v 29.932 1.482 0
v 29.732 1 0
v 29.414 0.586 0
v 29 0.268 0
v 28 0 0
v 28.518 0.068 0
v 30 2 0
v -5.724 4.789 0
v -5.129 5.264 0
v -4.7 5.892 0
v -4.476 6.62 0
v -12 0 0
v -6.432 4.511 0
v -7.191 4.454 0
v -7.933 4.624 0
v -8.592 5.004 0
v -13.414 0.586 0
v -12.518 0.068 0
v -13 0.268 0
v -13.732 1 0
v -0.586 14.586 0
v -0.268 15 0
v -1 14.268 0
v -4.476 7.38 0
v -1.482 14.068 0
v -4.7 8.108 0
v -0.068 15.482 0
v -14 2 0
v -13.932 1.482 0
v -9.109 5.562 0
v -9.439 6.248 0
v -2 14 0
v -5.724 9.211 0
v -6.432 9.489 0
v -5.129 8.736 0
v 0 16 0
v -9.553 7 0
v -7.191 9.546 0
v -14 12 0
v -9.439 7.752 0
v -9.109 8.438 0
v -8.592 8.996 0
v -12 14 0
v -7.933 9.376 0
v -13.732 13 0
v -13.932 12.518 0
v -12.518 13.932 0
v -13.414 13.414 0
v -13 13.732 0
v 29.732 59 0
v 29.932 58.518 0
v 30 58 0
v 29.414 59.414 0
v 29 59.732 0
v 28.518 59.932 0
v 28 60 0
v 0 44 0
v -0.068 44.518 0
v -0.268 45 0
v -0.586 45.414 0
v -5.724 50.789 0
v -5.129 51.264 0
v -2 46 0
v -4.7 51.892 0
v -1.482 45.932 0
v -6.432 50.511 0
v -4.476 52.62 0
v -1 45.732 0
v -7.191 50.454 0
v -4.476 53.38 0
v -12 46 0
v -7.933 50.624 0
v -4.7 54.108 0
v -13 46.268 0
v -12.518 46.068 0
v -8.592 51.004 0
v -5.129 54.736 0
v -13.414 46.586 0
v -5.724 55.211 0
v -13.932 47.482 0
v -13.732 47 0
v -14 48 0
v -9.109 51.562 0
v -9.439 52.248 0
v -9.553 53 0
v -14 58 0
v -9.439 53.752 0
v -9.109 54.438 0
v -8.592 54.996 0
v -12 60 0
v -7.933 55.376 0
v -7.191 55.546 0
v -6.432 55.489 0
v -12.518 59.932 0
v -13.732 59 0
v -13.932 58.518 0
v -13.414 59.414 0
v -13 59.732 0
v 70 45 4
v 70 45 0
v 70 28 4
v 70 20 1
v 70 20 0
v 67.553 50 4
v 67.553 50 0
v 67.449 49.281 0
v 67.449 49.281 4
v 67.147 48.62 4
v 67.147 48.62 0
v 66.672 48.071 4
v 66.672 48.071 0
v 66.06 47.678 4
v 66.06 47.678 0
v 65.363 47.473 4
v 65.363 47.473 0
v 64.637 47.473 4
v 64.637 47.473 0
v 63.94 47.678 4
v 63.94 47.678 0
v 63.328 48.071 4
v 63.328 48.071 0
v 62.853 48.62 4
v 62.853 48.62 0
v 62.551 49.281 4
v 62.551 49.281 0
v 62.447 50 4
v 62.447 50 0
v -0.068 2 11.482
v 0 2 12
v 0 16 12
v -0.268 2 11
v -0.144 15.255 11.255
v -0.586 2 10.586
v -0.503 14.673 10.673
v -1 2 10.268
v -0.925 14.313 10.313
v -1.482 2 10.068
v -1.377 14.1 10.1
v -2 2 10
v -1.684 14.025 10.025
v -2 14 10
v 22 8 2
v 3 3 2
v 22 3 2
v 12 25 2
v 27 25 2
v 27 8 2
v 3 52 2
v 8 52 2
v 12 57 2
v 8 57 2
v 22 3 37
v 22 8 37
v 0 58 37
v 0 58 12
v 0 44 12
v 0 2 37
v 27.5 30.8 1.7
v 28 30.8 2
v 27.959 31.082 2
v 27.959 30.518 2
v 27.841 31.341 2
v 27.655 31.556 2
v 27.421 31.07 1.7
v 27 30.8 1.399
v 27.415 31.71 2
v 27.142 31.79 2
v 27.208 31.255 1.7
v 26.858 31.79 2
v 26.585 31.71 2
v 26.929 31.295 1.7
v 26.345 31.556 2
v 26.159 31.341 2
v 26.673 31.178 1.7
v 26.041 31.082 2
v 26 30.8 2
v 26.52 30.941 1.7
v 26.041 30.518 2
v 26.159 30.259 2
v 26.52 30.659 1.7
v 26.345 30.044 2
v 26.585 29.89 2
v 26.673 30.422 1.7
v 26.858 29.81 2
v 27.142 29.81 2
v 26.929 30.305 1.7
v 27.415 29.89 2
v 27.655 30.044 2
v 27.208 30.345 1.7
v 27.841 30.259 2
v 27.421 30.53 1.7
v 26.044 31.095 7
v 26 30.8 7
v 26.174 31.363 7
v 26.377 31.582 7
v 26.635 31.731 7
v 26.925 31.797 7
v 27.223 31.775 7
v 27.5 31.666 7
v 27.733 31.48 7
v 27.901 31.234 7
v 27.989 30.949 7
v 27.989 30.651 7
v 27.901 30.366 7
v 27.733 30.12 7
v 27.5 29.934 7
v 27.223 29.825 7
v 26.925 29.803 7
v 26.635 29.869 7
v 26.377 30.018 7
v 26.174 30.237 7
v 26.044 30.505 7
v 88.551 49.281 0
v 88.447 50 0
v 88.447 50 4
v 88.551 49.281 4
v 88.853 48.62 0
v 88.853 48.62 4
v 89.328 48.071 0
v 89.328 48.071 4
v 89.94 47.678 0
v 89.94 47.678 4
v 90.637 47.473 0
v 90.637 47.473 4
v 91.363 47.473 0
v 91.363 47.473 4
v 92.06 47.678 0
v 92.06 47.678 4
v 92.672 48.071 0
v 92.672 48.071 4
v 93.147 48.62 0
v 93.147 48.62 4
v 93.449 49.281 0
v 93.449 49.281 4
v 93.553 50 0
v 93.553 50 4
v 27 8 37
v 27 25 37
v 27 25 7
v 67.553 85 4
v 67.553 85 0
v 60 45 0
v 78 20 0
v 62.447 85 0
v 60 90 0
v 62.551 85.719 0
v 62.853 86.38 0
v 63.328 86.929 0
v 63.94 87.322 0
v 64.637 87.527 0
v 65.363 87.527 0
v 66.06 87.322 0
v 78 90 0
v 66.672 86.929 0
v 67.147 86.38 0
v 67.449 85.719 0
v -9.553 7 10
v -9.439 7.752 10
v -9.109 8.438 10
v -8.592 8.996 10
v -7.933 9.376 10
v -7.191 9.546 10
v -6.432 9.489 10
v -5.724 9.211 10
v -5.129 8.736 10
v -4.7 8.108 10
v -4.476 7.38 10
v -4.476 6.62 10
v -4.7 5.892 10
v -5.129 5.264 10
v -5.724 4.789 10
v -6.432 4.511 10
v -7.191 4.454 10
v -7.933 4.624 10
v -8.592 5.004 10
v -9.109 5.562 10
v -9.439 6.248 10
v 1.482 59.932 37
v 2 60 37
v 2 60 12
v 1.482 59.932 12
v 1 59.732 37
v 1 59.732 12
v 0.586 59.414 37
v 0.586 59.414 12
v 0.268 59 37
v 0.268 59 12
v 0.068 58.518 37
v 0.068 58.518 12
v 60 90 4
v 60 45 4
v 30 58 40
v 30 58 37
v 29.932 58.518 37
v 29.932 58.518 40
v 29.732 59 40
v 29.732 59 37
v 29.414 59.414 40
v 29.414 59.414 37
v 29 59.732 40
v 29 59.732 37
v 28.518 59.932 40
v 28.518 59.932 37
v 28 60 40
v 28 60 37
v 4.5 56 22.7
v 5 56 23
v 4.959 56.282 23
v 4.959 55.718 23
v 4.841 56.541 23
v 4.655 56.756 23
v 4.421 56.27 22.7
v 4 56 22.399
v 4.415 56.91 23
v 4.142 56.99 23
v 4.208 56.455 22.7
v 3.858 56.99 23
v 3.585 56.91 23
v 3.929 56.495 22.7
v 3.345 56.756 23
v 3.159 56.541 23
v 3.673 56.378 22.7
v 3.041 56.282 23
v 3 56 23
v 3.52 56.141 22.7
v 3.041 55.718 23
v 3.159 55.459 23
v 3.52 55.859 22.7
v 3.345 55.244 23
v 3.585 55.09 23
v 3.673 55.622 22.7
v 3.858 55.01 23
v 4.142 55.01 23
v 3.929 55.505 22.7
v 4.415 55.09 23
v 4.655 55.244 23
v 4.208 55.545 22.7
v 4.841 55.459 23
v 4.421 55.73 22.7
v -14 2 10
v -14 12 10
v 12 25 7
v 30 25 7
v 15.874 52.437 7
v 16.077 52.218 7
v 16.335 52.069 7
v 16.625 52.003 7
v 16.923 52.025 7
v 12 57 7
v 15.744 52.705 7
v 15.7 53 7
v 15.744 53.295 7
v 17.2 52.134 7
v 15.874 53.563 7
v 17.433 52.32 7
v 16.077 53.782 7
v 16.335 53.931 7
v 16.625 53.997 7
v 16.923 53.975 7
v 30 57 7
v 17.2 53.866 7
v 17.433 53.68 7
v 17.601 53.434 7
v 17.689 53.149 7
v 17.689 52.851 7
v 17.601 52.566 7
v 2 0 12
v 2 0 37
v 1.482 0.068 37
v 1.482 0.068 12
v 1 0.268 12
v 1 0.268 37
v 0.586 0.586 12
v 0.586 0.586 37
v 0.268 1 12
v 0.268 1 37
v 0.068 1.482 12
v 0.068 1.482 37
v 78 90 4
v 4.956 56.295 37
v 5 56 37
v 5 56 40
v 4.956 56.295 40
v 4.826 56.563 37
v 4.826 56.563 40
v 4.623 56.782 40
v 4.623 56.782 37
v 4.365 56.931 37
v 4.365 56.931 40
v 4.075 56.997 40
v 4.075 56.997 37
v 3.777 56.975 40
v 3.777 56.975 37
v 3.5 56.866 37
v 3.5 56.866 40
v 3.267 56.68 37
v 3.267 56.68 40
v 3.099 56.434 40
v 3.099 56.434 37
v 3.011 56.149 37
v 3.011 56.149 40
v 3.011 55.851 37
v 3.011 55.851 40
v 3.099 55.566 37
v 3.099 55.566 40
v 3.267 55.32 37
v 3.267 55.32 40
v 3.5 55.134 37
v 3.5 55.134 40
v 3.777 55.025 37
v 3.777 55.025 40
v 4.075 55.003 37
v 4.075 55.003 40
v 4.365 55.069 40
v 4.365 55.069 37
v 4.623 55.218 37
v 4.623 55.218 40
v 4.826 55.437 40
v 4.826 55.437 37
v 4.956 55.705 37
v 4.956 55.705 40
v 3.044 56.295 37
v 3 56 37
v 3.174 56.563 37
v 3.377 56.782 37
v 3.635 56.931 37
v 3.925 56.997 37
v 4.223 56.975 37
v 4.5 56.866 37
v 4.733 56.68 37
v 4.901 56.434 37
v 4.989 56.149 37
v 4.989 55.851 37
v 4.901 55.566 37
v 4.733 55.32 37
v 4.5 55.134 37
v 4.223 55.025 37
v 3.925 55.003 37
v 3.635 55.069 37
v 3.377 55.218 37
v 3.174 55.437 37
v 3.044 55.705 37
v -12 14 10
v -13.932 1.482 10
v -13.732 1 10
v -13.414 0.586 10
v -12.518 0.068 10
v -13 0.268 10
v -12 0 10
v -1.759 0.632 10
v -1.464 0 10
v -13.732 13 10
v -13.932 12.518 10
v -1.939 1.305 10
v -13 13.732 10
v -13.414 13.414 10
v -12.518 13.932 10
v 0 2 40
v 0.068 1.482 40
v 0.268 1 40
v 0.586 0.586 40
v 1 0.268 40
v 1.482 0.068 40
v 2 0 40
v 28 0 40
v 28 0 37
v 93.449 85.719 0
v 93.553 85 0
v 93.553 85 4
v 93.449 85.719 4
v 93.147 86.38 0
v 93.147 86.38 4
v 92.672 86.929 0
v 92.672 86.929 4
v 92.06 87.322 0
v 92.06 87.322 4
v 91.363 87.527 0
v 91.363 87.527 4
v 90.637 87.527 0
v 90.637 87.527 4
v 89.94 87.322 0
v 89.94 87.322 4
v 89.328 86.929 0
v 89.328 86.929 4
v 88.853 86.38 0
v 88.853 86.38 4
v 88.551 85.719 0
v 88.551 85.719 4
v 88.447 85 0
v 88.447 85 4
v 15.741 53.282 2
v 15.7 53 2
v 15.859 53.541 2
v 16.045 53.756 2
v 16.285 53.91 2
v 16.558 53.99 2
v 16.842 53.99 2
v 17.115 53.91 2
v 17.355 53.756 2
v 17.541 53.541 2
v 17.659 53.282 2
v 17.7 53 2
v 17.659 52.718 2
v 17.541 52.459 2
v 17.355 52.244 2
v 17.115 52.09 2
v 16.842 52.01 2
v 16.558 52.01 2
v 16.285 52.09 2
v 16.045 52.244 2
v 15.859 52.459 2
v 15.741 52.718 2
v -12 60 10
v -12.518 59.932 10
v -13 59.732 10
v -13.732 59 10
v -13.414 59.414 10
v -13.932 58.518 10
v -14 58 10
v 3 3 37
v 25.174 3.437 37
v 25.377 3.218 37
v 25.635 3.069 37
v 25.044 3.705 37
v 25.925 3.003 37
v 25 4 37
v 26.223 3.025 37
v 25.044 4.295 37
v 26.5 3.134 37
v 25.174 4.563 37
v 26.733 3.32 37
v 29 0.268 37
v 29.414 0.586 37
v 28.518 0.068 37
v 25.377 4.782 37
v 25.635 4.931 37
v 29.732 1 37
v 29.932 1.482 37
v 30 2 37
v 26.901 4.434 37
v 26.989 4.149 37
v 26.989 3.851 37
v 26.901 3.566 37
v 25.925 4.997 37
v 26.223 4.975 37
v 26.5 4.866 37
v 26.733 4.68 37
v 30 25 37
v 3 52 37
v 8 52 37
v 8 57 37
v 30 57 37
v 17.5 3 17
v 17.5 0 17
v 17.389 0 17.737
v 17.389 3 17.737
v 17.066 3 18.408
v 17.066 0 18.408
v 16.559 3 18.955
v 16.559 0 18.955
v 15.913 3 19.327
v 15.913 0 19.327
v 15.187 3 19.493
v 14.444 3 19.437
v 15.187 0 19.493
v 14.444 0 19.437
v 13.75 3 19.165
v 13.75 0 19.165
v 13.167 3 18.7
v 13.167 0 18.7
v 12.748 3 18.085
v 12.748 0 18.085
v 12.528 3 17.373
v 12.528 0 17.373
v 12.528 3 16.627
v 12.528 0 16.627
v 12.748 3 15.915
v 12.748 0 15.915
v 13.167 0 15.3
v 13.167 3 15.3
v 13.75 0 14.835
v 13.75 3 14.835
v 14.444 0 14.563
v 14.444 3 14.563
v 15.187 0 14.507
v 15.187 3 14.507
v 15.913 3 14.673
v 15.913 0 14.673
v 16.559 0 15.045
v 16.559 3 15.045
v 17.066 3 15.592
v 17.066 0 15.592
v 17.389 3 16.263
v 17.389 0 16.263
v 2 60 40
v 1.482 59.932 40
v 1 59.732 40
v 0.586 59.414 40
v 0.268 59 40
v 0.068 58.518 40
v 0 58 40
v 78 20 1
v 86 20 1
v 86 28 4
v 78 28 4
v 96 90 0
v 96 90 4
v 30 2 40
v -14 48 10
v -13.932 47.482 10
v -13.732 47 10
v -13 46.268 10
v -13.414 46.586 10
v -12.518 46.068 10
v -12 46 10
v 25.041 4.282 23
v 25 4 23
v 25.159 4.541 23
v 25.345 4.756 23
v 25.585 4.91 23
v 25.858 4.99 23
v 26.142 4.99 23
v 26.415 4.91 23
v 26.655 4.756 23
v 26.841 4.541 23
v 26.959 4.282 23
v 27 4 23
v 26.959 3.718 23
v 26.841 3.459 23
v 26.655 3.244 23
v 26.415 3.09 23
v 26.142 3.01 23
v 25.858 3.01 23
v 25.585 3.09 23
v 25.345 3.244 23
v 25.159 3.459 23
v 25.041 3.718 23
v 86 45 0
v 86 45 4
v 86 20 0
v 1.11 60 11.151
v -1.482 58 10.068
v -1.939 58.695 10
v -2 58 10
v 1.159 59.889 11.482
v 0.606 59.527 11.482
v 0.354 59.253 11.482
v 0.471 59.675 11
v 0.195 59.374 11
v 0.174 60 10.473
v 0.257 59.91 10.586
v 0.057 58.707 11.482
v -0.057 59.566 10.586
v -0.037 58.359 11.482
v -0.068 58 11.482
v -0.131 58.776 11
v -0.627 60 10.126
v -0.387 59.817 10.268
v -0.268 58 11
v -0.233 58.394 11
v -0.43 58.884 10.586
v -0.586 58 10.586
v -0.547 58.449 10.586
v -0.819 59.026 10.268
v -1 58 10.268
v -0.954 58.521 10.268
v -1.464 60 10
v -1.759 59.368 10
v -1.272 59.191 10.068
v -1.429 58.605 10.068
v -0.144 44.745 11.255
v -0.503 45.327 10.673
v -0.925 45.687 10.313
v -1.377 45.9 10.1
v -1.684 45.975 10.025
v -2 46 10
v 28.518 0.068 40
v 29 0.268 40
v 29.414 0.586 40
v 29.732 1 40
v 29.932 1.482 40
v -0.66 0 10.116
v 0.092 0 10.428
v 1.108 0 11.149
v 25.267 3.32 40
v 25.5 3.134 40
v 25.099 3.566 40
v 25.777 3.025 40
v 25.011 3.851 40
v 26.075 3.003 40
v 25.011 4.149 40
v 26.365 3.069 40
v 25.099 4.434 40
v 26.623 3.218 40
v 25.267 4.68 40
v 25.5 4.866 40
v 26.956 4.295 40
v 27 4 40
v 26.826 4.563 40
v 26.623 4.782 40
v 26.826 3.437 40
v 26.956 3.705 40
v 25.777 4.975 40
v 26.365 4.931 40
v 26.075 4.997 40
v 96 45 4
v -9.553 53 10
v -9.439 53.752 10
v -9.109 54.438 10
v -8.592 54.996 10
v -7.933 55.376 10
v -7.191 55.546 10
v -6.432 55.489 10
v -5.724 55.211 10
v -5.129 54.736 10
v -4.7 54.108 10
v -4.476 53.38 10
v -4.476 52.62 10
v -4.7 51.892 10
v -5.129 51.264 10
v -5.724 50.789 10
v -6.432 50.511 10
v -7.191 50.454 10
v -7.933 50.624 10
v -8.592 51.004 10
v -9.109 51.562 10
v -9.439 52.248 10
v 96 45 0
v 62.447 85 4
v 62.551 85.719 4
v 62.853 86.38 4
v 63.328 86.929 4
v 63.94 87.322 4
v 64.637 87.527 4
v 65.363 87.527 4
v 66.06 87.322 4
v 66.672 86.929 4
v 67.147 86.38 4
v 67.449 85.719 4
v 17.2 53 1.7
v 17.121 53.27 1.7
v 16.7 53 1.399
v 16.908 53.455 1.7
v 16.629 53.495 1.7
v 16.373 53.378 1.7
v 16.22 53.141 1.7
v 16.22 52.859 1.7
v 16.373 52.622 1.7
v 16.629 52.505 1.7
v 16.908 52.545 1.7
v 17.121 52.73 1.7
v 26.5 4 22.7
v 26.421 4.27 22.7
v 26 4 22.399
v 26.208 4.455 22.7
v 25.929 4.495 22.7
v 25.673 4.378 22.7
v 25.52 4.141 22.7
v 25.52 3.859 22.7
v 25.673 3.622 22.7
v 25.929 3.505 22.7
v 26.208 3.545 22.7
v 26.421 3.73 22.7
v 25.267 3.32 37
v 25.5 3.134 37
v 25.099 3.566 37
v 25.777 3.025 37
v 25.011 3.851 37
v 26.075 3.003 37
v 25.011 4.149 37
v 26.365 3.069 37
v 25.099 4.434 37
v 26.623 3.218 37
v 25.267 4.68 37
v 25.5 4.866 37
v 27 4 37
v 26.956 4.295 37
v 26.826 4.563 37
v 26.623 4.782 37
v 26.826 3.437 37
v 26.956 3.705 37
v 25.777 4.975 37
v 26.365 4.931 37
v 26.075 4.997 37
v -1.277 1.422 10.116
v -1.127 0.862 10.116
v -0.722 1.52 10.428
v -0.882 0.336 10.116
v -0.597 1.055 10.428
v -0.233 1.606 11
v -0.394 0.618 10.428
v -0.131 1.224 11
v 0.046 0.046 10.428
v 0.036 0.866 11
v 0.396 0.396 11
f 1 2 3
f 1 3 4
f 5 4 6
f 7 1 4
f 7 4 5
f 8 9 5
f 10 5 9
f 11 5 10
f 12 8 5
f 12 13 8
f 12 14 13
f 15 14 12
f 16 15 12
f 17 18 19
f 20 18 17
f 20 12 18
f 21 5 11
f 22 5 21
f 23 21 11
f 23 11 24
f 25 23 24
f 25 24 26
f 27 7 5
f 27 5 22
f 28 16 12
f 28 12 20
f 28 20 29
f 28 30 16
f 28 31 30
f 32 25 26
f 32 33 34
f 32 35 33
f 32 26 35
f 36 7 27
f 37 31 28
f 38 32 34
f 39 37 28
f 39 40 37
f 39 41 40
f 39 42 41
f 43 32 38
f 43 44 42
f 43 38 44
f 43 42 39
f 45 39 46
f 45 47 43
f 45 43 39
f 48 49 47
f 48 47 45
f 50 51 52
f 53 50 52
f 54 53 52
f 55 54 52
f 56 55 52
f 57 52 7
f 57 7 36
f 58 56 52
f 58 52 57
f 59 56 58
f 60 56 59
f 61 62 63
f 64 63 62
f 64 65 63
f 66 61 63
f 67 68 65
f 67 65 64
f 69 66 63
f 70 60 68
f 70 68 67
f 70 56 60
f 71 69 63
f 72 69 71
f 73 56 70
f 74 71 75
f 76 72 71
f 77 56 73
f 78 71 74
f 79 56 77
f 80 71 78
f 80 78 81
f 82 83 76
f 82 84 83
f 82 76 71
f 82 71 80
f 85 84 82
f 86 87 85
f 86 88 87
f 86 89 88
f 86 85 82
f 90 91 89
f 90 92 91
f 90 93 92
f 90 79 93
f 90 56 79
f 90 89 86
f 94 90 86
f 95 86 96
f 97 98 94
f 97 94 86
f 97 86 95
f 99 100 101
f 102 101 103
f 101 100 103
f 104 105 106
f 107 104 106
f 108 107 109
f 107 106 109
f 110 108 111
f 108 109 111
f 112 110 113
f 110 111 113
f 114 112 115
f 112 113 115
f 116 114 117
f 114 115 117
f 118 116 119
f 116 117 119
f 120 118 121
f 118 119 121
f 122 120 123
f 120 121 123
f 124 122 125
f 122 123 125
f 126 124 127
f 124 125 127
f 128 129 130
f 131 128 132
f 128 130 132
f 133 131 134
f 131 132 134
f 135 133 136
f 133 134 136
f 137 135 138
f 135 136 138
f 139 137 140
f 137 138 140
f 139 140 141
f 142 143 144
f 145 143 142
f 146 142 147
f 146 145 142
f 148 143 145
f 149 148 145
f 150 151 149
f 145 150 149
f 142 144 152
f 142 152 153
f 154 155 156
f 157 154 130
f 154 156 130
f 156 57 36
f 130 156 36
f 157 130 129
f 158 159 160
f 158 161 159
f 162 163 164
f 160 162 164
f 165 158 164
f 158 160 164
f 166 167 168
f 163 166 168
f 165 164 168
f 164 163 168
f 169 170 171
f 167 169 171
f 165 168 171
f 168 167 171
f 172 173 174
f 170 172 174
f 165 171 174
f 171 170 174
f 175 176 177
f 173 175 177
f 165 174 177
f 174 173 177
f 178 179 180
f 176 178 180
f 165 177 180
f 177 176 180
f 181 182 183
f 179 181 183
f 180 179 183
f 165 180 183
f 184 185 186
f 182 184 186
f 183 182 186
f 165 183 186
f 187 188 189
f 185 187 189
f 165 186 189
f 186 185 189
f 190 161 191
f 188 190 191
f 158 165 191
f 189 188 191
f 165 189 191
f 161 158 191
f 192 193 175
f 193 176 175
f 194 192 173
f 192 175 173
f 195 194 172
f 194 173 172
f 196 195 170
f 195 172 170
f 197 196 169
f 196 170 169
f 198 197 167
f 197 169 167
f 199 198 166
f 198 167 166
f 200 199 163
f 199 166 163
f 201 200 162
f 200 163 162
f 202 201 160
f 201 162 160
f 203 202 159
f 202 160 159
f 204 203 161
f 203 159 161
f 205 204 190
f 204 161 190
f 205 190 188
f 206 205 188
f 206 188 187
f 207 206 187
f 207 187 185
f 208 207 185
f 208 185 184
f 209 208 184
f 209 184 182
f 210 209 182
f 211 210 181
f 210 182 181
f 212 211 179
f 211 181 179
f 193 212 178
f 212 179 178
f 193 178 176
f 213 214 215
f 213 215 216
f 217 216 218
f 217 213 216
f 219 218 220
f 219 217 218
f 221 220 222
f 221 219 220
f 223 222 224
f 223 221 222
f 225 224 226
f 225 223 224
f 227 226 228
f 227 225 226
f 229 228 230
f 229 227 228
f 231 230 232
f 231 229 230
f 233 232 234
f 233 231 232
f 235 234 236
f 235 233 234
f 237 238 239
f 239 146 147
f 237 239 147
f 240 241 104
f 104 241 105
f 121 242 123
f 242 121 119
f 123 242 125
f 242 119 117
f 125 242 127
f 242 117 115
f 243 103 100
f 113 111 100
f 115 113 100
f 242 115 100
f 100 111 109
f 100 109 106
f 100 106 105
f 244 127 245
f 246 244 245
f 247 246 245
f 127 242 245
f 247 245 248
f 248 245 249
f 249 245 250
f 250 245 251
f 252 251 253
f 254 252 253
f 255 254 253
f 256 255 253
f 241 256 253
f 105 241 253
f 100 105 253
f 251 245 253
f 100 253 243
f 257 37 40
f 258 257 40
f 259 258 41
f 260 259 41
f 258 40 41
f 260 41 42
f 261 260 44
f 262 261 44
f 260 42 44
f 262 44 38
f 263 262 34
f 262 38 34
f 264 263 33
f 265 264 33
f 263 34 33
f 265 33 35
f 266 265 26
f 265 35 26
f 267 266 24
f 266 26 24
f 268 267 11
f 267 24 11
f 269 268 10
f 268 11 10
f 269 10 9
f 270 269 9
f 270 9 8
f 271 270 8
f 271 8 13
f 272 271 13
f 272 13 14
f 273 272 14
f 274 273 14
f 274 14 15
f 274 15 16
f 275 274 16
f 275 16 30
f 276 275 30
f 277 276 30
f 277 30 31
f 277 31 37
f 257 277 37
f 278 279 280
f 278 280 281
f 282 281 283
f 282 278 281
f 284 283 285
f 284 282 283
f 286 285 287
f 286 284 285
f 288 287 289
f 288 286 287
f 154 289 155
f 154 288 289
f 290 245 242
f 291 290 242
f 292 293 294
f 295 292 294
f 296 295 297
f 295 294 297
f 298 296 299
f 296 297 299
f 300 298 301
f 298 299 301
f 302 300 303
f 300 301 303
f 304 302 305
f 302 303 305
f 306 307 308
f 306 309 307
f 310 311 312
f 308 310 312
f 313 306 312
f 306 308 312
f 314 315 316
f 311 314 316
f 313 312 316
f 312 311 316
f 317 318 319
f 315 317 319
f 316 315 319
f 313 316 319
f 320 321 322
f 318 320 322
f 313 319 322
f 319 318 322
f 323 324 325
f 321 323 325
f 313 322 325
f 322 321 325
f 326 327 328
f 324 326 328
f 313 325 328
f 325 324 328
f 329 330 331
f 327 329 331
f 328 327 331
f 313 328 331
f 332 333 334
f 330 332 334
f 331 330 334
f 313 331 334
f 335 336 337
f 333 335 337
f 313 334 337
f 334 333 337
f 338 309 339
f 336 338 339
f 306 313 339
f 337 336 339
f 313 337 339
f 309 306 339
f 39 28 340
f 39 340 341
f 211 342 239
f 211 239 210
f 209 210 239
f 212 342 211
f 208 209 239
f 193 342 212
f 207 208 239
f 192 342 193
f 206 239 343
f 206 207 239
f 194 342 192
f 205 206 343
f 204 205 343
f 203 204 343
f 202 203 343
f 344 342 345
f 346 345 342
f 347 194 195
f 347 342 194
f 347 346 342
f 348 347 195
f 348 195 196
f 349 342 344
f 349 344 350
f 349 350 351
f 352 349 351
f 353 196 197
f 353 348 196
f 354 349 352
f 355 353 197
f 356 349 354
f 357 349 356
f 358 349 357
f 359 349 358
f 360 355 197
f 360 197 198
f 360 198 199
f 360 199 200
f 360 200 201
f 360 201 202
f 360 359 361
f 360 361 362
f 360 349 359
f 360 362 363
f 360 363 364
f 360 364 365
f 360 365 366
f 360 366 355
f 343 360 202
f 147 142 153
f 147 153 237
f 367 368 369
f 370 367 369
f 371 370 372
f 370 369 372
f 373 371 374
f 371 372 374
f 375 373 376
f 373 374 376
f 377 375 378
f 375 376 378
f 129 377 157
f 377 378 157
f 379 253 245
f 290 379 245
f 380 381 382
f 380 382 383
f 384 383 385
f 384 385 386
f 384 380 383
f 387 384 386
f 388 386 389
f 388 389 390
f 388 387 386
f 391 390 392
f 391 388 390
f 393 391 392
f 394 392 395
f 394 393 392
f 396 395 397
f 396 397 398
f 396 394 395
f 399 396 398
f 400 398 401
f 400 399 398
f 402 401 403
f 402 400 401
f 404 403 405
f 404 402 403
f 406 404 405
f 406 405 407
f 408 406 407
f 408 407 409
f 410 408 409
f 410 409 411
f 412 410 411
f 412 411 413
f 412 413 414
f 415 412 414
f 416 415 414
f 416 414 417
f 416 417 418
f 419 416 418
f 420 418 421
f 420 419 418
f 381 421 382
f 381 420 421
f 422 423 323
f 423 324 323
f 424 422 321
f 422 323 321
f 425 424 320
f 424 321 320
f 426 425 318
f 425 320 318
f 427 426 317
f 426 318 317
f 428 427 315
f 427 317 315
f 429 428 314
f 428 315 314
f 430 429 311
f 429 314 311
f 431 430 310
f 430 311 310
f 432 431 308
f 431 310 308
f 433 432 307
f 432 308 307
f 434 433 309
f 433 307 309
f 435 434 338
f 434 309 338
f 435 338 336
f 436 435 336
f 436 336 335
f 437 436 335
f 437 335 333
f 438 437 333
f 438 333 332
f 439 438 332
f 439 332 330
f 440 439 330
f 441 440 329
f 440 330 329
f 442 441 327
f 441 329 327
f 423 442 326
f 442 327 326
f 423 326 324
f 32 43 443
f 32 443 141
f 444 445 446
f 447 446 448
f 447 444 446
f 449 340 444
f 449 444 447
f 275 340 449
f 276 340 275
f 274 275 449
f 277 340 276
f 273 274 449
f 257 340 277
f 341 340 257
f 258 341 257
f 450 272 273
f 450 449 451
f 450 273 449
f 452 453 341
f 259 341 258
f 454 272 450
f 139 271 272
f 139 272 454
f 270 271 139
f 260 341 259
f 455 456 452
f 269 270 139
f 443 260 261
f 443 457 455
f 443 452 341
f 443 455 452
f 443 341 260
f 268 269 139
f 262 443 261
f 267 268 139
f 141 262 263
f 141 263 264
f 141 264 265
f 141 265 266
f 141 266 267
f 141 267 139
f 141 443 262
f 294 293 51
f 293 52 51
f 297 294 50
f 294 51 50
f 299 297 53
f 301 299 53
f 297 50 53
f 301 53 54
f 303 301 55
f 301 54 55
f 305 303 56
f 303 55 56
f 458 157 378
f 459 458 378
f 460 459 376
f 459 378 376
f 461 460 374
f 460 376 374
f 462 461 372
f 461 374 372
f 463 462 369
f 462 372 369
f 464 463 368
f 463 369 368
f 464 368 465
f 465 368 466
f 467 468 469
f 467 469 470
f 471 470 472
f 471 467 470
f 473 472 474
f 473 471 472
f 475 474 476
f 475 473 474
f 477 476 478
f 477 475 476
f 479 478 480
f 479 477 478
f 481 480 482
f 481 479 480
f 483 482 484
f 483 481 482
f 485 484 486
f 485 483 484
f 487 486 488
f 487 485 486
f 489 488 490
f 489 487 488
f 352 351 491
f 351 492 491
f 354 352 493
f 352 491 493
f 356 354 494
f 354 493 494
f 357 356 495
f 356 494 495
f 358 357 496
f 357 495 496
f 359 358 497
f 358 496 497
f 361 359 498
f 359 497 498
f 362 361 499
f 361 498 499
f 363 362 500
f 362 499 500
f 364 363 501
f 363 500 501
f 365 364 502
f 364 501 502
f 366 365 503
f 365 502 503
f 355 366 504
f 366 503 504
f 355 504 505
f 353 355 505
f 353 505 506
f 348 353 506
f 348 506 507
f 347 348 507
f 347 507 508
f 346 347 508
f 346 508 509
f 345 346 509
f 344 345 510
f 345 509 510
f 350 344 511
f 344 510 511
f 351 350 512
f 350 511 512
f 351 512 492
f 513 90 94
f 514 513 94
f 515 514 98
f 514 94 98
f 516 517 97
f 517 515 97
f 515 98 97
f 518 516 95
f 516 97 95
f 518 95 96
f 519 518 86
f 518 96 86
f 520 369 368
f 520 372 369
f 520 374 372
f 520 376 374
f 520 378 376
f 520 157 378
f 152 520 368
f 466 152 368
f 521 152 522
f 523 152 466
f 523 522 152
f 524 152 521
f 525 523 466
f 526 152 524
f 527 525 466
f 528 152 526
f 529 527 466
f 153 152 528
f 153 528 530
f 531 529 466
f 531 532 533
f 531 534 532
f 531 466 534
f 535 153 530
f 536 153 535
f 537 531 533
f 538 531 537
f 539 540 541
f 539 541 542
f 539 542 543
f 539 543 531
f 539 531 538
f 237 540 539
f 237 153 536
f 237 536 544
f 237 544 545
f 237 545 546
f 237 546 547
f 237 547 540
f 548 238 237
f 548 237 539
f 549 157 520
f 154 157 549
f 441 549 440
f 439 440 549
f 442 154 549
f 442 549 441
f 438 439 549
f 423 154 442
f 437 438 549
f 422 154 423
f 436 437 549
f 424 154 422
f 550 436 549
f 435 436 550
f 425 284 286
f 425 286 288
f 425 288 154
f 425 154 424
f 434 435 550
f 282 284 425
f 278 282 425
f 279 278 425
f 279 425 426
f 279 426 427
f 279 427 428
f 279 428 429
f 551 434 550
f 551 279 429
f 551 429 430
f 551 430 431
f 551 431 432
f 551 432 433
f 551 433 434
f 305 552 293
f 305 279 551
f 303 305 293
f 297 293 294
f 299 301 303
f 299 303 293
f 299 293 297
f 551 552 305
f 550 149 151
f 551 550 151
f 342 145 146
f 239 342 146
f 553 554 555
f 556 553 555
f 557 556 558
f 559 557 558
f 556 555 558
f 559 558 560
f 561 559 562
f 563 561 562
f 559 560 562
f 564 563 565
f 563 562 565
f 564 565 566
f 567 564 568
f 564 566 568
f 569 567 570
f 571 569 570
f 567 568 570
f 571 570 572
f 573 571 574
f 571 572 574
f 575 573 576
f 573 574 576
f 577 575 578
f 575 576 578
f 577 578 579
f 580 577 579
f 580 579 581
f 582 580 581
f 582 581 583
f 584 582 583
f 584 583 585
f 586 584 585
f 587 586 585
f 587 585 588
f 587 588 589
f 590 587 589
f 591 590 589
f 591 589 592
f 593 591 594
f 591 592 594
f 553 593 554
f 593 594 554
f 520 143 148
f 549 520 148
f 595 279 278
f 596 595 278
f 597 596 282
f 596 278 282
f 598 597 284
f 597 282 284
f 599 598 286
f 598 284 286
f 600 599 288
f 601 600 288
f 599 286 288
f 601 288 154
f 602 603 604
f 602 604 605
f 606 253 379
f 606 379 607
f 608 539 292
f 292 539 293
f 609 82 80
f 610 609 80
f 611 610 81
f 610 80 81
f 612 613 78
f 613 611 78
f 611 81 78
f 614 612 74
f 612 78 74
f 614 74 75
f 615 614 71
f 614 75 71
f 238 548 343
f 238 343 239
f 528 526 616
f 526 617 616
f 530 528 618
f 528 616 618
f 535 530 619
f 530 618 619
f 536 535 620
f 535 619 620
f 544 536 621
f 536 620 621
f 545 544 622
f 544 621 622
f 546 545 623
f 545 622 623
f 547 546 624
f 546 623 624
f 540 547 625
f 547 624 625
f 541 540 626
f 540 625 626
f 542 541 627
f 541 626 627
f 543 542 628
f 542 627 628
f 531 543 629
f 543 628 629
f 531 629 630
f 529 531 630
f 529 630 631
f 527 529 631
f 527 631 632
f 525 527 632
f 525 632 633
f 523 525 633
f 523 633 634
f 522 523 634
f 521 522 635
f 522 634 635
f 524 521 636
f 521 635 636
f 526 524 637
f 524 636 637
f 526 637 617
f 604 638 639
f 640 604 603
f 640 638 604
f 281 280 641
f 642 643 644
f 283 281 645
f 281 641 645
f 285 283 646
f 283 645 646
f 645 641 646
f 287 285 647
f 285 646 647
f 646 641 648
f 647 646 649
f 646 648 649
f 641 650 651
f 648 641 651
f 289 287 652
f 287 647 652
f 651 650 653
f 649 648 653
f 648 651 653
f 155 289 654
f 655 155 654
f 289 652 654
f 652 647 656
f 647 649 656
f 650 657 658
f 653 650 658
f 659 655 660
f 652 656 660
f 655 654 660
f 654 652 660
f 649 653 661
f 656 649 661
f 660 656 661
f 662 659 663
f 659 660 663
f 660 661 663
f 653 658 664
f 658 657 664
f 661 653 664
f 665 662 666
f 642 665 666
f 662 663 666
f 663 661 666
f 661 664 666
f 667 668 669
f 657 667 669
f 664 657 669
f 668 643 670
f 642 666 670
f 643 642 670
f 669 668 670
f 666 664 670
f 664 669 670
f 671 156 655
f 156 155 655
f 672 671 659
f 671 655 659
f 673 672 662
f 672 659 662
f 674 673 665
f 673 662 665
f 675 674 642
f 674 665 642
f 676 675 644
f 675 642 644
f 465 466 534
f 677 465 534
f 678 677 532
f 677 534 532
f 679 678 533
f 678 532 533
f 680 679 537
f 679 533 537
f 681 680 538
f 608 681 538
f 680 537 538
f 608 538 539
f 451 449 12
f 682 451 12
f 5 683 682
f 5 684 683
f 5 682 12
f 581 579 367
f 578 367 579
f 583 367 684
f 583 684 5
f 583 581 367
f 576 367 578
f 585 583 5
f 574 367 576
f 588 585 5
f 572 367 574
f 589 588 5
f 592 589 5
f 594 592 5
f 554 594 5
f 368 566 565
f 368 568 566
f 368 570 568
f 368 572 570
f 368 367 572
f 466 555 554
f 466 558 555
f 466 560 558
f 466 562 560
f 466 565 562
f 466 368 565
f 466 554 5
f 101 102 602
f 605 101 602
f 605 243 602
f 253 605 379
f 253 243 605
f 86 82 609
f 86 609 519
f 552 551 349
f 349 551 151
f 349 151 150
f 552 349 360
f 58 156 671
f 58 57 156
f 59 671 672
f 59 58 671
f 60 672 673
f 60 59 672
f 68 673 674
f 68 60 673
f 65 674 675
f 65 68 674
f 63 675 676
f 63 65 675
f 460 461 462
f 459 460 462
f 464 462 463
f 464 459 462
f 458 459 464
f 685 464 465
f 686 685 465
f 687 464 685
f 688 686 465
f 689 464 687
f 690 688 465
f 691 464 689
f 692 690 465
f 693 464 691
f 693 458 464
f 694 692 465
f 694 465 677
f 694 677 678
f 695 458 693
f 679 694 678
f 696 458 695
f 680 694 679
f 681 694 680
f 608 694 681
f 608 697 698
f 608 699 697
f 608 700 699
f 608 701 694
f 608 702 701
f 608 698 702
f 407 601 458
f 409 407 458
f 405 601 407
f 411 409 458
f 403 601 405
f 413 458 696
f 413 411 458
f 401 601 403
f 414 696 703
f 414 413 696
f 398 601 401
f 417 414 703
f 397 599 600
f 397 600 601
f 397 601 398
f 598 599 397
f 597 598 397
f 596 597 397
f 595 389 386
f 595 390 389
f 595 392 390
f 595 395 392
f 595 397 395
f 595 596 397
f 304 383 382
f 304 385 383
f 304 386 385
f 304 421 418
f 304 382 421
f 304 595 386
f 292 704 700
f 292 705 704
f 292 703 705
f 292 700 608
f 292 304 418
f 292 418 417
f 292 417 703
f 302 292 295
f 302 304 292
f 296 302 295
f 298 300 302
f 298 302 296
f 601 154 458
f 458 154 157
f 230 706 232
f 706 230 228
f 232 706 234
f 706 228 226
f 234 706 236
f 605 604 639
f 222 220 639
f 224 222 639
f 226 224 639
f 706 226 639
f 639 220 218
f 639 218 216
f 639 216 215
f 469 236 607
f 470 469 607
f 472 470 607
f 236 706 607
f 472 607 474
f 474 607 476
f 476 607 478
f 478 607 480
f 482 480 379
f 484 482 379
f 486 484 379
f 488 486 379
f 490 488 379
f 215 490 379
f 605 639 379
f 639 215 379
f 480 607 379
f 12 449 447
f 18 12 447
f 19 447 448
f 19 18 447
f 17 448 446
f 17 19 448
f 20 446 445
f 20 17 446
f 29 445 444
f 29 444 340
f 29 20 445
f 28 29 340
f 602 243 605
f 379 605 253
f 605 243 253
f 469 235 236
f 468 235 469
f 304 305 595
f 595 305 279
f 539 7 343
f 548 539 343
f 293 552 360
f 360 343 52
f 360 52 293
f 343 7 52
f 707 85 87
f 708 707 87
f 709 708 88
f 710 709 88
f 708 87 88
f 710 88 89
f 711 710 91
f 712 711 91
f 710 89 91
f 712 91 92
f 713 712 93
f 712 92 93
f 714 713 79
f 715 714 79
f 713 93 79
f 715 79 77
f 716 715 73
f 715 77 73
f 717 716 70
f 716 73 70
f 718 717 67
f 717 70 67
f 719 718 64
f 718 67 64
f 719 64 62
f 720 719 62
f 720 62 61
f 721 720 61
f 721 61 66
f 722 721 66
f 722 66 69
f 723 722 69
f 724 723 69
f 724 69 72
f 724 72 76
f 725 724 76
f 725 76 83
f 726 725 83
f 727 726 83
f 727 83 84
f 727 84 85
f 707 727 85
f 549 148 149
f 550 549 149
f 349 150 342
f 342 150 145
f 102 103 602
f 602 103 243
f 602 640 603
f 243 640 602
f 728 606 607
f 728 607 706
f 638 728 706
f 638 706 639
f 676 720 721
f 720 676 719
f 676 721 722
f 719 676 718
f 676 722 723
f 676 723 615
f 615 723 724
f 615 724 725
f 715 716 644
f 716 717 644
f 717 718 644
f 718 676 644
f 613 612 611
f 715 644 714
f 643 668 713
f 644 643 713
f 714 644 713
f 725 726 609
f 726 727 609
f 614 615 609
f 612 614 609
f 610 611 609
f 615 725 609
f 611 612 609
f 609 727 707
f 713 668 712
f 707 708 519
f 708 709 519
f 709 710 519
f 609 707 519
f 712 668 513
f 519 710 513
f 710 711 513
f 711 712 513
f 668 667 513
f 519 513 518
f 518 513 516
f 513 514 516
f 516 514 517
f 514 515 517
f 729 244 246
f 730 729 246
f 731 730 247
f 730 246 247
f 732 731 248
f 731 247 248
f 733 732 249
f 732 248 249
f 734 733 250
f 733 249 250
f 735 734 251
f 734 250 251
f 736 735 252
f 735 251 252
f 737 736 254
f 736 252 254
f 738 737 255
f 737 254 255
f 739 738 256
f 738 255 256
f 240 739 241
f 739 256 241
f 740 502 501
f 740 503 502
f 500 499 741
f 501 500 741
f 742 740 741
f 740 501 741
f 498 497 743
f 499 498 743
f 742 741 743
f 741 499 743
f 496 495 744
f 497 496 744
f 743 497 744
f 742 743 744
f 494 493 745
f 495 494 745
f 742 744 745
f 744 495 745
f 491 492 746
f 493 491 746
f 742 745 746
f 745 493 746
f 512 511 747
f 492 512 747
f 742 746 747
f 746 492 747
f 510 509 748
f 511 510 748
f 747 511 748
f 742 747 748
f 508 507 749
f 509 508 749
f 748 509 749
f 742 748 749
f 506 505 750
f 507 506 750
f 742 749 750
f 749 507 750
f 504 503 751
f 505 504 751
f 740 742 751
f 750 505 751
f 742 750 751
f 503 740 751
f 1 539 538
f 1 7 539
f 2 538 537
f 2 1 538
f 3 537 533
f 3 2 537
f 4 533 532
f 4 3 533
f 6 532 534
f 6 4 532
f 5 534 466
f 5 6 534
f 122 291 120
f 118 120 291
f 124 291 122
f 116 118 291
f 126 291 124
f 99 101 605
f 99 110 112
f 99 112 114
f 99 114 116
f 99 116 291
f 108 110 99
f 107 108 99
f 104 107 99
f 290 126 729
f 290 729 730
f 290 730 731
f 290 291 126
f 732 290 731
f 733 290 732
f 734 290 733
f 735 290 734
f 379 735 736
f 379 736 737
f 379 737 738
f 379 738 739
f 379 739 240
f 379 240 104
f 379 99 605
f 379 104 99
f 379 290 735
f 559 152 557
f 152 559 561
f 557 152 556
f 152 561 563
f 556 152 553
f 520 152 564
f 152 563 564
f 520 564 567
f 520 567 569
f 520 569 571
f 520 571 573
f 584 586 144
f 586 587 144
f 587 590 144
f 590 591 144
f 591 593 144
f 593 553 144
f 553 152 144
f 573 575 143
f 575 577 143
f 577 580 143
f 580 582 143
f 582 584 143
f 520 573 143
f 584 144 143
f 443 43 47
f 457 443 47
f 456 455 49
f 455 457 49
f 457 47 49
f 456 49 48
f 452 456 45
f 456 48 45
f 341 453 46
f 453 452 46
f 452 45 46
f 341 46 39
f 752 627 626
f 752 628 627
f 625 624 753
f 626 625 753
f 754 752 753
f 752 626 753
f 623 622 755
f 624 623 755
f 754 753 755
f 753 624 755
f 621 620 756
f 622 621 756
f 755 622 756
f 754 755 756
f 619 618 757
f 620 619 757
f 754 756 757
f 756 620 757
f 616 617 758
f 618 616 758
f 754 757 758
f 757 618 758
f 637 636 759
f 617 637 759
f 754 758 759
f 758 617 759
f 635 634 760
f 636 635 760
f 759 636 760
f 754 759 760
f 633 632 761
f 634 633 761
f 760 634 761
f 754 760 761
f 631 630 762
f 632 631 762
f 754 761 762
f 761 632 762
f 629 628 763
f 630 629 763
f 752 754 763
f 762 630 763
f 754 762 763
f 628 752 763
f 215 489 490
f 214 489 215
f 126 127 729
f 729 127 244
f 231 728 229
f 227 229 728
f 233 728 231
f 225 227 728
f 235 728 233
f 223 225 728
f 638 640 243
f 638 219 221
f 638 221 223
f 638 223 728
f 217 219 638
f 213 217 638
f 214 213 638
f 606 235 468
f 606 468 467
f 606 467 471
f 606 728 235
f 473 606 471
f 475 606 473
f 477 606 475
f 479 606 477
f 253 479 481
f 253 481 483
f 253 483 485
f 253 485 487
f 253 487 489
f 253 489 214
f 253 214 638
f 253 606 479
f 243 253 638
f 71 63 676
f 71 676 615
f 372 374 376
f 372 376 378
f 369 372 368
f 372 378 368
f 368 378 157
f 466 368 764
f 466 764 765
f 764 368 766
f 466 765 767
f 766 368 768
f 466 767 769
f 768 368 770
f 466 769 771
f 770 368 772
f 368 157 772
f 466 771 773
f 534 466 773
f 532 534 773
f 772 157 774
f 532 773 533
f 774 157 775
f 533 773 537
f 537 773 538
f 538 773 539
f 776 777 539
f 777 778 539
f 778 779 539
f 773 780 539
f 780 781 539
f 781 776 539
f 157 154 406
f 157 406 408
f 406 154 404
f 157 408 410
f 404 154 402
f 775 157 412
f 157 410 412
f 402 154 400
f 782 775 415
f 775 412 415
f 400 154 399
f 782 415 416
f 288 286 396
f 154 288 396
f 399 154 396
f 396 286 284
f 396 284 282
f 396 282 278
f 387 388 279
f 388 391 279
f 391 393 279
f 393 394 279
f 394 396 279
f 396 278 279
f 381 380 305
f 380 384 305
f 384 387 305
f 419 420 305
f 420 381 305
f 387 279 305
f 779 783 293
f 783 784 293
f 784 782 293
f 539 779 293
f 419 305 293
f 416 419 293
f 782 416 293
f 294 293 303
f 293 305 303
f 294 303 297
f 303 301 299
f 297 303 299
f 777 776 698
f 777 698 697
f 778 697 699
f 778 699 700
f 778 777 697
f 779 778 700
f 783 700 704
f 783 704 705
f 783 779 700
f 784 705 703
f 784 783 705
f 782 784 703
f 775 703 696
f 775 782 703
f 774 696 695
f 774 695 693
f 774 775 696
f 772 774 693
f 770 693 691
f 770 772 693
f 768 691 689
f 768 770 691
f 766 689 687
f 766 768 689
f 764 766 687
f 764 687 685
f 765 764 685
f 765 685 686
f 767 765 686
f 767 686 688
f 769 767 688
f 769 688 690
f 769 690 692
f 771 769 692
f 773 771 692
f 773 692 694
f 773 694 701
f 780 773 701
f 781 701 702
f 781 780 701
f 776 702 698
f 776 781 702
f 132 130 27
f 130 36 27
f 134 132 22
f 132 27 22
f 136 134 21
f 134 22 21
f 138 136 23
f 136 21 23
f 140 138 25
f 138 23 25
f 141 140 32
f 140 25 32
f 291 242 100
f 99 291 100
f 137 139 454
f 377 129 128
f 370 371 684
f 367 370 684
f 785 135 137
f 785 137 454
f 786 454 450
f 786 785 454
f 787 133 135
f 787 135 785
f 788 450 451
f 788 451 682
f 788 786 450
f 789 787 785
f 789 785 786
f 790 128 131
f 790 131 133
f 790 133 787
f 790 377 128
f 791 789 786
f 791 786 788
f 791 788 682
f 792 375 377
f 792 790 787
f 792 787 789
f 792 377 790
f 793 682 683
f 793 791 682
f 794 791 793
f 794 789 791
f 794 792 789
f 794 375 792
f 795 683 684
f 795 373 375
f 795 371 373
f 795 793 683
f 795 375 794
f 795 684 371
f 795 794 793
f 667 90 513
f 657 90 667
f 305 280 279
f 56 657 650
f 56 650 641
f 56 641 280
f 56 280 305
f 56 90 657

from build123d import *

# Parameters (mm, degrees)
F0_W          = 30
F0_H          = 60
F1_DEPTH      = 2
F3_DEPTH      = 35
F4_DEPTH      = 5
F6_D          = 2
F6_DEPTH      = 5
F6_TIP        = 0.600860619
F7_R          = 2
F8_W          = 5
F8_H          = 5
F9_DEPTH      = 35
F11_D         = 2
F11_DEPTH     = 14
F11_TIP       = 0.600860619
F12_R         = 2.5
F13_DEPTH     = 3
F15_DEPTH     = 10
F17_D         = 5.1054
F18_T1_DEPTH  = 10
F18_T3_DEPTH  = 12
F18_T5_DEPTH  = 12
F18_T10_ANGLE = 233.2969892374
F18_T15_ANGLE = 233.2969892374
F18_T22_DEPTH = 17
F18_T26_DEPTH = 15
F18_T33_DEPTH = 15
F18_T37_DEPTH = 17
F18_T40_DEPTH = 20
F19_R         = 1
F20_DEPTH     = 3
F22_DEPTH     = 4
F23_SIZE2     = 3
F23_SIZE      = 8


# Not quite as in the source:
# - a fillet or chamfer that OpenCascade refuses, or shapes differently, is made with other operations: its cross-section is extruded or revolved along the edge and cut away or added


with BuildPart() as f1:
    # F0 (on Top) → F1 (new body)
    with BuildSketch(Plane.XY):
        with Locations((15, 30)):
            Rectangle(F0_W, F0_H)
    extrude(amount=F1_DEPTH)

    # F2 (on face) → F3 (join)
    with BuildSketch(Plane.XY.offset(2)):
        Polygon((30, 60), (0, 60), (0, 0), (30, 0), (30, 25), (27, 25), (27, 3), (3, 3), (3, 57), (12, 57), (30, 57), align=None)
    extrude(amount=F3_DEPTH)

    # F2 (on face) → F4 (join)
    with BuildSketch(Plane.XY.offset(2)):
        Polygon((30, 25), (30, 57), (12, 57), (12, 25), (27, 25), align=None)
    extrude(amount=F4_DEPTH)

    # F6
    with Locations(Plane.XY.offset(7)):
        with Locations((16.7, 53), (27, 30.8)):
            Hole(F6_D / 2, depth=F6_DEPTH)
            with Locations((0, 0, -(F6_DEPTH + F6_TIP / 2))):  # 118° drill point
                Cone(0, F6_D / 2, F6_TIP, mode=Mode.SUBTRACT)

    # F7
    f7_edges = [f1.edges().sort_by_distance(p)[0] for p in [
        (30, 0, 18.5),
        (0, 0, 18.5),
        (0, 60, 18.5),
        (30, 60, 18.5),
    ]]
    fillet(f7_edges, radius=F7_R)

    # F8 (on face) → F9 (join, through all)
    with BuildSketch(Plane.XY.offset(2)):
        with Locations((5.5, 54.5)):
            Rectangle(F8_W, F8_H)
        with Locations((24.5, 5.5)):
            Rectangle(F8_W, F8_H)
    extrude(amount=F9_DEPTH)

    # F11
    with Locations(Plane.XY.offset(37)):
        with Locations((4, 56), (26, 4)):
            Hole(F11_D / 2, depth=F11_DEPTH)
            with Locations((0, 0, -(F11_DEPTH + F11_TIP / 2))):  # 118° drill point
                Cone(0, F11_D / 2, F11_TIP, mode=Mode.SUBTRACT)

    # F12 (on face) → F13 (cut, through all)
    with BuildSketch(Plane.XZ):
        with Locations((15, 17)):
            Circle(F12_R)
    extrude(amount=-F13_DEPTH, mode=Mode.SUBTRACT)

    # F14 (on face) → F15 (join)
    with BuildSketch(Plane(origin=(0, 0, 0), x_dir=(1, 0, 0), z_dir=(0, 0, -1))):
        with BuildLine():
            Line((0, -58), (0, -46))
            Line((0, -46), (-14, -46))
            Line((-14, -46), (-14, -60))
            Line((-14, -60), (2, -60))
            ThreePointArc((2, -60), (0.5857864376, -59.4142135624), (0, -58))
        make_face()
        with BuildLine():
            ThreePointArc((0, -2), (0.5857864376, -0.5857864376), (2, 0))
            Line((2, 0), (-14, 0))
            Line((-14, 0), (-14, -14))
            Line((-14, -14), (0, -14))
            Line((0, -14), (0, -2))
        make_face()
    extrude(amount=-F15_DEPTH)

    # F17 (through all)
    with Locations(Plane.XY.offset(10)):
        with Locations((-7, 53), (-7, 7)):
            Hole(F17_D / 2)

    # F18: fillet of radius 2 on 8 edges, made by hand

    # F18_s2 → F18_t1 (join)
    with BuildSketch(Plane.XY):
        with BuildLine():
            ThreePointArc((0, 44), (-0.5857864376, 45.4142135624), (-2, 46))
            Line((-2, 46), (0, 46))
            Line((0, 46), (0, 44))
        make_face()
        with BuildLine():
            ThreePointArc((0, 16), (-0.5857864376, 14.5857864376), (-2, 14))
            Line((-2, 14), (0, 14))
            Line((0, 14), (0, 16))
        make_face()
    extrude(amount=F18_T1_DEPTH)

    # F18_s4 → F18_t3 (join)
    with BuildSketch(Plane.XZ.offset(-14)):
        with BuildLine():
            ThreePointArc((0, 12), (-0.5857864376, 10.5857864376), (-2, 10))
            Line((-2, 10), (0, 10))
            Line((0, 10), (0, 12))
        make_face()
    extrude(amount=F18_T3_DEPTH)

    # F18_s6 → F18_t5 (join)
    with BuildSketch(Plane.XZ.offset(-58)):
        with BuildLine():
            ThreePointArc((0, 12), (-0.5857864376, 10.5857864376), (-2, 10))
            Line((-2, 10), (0, 10))
            Line((0, 10), (0, 12))
        make_face()
    extrude(amount=F18_T5_DEPTH)


with BuildPart() as f18_tool8:
    # F18_s9 → F18_t10 (revolve)
    with BuildSketch(Plane(origin=(29.0778128683, 21.6763107294, 0), x_dir=(0, 0, 1), z_dir=(-0.8017442393, -0.5976672776, 0))):
        with BuildLine():
            ThreePointArc((12, 43.305831324), (10.5857864376, 42.7200448864), (10, 41.305831324))
            Line((10, 41.305831324), (10, 43.305831324))
            Line((10, 43.305831324), (12, 43.305831324))
        make_face()
    revolve(axis=Axis((2, 58, 10), (0, 0, 1)), revolution_arc=F18_T10_ANGLE)

    split(bisect_by=Plane.XZ.offset(-60), keep=Keep.TOP)


with BuildPart() as f1_1:
    add(f1.part)

    # F18_t7: union F18_tool8
    add(f18_tool8.part)


with BuildPart() as f18_tool13:
    # F18_s14 → F18_t15 (revolve)
    with BuildSketch(Plane.XZ.offset(-2)):
        with BuildLine():
            ThreePointArc((-2, 10), (-0.5857864376, 10.5857864376), (0, 12))
            Line((0, 12), (0, 10))
            Line((0, 10), (-2, 10))
        make_face()
    revolve(axis=Axis((2, 2, 10), (0, 0, 1)), revolution_arc=F18_T15_ANGLE)

    split(bisect_by=Plane.XZ, keep=Keep.BOTTOM)

    split(bisect_by=Plane.XZ.offset(-3), keep=Keep.TOP)


with BuildPart() as f1_2:
    add(f1_1.part)

    # F18_t12: union F18_tool13
    add(f18_tool13.part)


with BuildPart() as f18_tool20:
    # F18_s21 → F18_t22 (new body)
    with BuildSketch(Plane.XZ.offset(-58)):
        with BuildLine():
            ThreePointArc((0, 12), (-0.5857864376, 10.5857864376), (-2, 10))
            Line((-2, 10), (0, 10))
            Line((0, 10), (0, 12))
        make_face()
    extrude(amount=F18_T22_DEPTH)

    split(bisect_by=Plane.XZ.offset(-46), keep=Keep.TOP)


with BuildPart() as f18_tool24:
    # F18_s25 → F18_t26 (new body)
    with BuildSketch(Plane.XY):
        with BuildLine():
            ThreePointArc((0, 44), (-0.5857864376, 45.4142135624), (-2, 46))
            Line((-2, 46), (0, 46))
            Line((0, 46), (0, 44))
        make_face()
    extrude(amount=F18_T26_DEPTH)

    split(bisect_by=Plane.XY.offset(10), keep=Keep.TOP)


with BuildPart() as f18_tool20_1:
    add(f18_tool20.part)

    # F18_t28: intersect F18_tool24
    add(f18_tool24.part, mode=Mode.INTERSECT)


with BuildPart() as f1_3:
    add(f1_2.part)

    # F18_t18: union F18_tool20
    add(f18_tool20_1.part)


with BuildPart() as f18_tool31:
    # F18_s32 → F18_t33 (new body)
    with BuildSketch(Plane.XY):
        with BuildLine():
            ThreePointArc((0, 16), (-0.5857864376, 14.5857864376), (-2, 14))
            Line((-2, 14), (0, 14))
            Line((0, 14), (0, 16))
        make_face()
    extrude(amount=F18_T33_DEPTH)

    split(bisect_by=Plane.XY.offset(10), keep=Keep.TOP)


with BuildPart() as f18_tool35:
    # F18_s36 → F18_t37 (new body)
    with BuildSketch(Plane.XZ.offset(-19)):
        with BuildLine():
            ThreePointArc((0, 12), (-0.5857864376, 10.5857864376), (-2, 10))
            Line((-2, 10), (0, 10))
            Line((0, 10), (0, 12))
        make_face()
    extrude(amount=F18_T37_DEPTH)

    split(bisect_by=Plane.XZ.offset(-14), keep=Keep.BOTTOM)


with BuildPart() as f18_tool31_1:
    add(f18_tool31.part)

    # F18_t39: intersect F18_tool35
    add(f18_tool35.part, mode=Mode.INTERSECT)


with BuildPart() as f1_4:
    add(f1_3.part)

    # F18_t29: union F18_tool31
    add(f18_tool31_1.part)

    # F18_s41 → F18_t40 (cut)
    with BuildSketch(Plane.XY.offset(-5)):
        with BuildLine():
            ThreePointArc((-14, 48), (-13.4142135624, 46.5857864376), (-12, 46))
            Line((-12, 46), (-14, 46))
            Line((-14, 46), (-14, 48))
        make_face()
        with BuildLine():
            ThreePointArc((-12, 60), (-13.4142135624, 59.4142135624), (-14, 58))
            Line((-14, 58), (-14, 60))
            Line((-14, 60), (-12, 60))
        make_face()
        with BuildLine():
            ThreePointArc((-12, 0), (-13.4142135624, 0.5857864376), (-14, 2))
            Line((-14, 2), (-14, 0))
            Line((-14, 0), (-12, 0))
        make_face()
        with BuildLine():
            ThreePointArc((-12, 14), (-13.4142135624, 13.4142135624), (-14, 12))
            Line((-14, 12), (-14, 14))
            Line((-14, 14), (-12, 14))
        make_face()
    extrude(amount=F18_T40_DEPTH, mode=Mode.SUBTRACT)


with BuildPart() as f20:
    # F19 (on face) → F20 (new body)
    with BuildSketch(Plane.XY.offset(37)):
        with BuildLine():
            Line((30, 2), (30, 25))
            Line((30, 25), (27, 25))
            Line((27, 25), (27, 8))
            Line((27, 8), (22, 8))
            Line((22, 8), (22, 3))
            Line((22, 3), (3, 3))
            Line((3, 3), (3, 52))
            Line((3, 52), (8, 52))
            Line((8, 52), (8, 57))
            Line((8, 57), (30, 57))
            Line((30, 57), (30, 58))
            ThreePointArc((30, 58), (29.4142135624, 59.4142135624), (28, 60))
            Line((28, 60), (2, 60))
            ThreePointArc((2, 60), (0.5857864376, 59.4142135624), (0, 58))
            Line((0, 58), (0, 2))
            ThreePointArc((0, 2), (0.5857864376, 0.5857864376), (2, 0))
            Line((2, 0), (28, 0))
            ThreePointArc((28, 0), (29.4142135624, 0.5857864376), (30, 2))
        make_face()
        with Locations((26, 4)):
            Circle(F19_R, mode=Mode.SUBTRACT)
        with Locations((4, 56)):
            Circle(F19_R, mode=Mode.SUBTRACT)
        Polygon((27, 25), (30, 25), (30, 57), (8, 57), (8, 52), (3, 52), (3, 3), (22, 3), (22, 8), (27, 8), align=None)
    extrude(amount=F20_DEPTH)


with BuildPart() as f22:
    # F21 (on Top) → F22 (new body)
    with BuildSketch(Plane.XY):
        Polygon((70, 45), (70, 20), (78, 20), (78, 90), (60, 90), (60, 45), align=None)
        with BuildLine():
            ThreePointArc((62.4473, 85), (65, 87.5527), (67.5527, 85))
            Line((67.5527, 85), (67.5527, 50))
            ThreePointArc((67.5527, 50), (65, 47.4473), (62.4473, 50))
            Line((62.4473, 50), (62.4473, 85))
        make_face(mode=Mode.SUBTRACT)
    extrude(amount=F22_DEPTH)

    # F23
    f23_edges = [f22.edges().sort_by_distance(p)[0] for p in [
        (74, 20, 4),
    ]]
    f23_side = f22.faces().sort_by_distance((71.21578, 58.866972, 4))[0]
    chamfer(f23_edges, length=F23_SIZE, length2=F23_SIZE2, reference=f23_side)


with BuildPart() as f24_1:
    # F24: instance of F22
    add(f22.part.mirror(Plane(origin=(78, 56.447761194, 1.9552238806), x_dir=(0, 1, 0), z_dir=(1, 0, 0))))


solid = Compound([f1_4.part, f20.part, f22.part, f24_1.part])
